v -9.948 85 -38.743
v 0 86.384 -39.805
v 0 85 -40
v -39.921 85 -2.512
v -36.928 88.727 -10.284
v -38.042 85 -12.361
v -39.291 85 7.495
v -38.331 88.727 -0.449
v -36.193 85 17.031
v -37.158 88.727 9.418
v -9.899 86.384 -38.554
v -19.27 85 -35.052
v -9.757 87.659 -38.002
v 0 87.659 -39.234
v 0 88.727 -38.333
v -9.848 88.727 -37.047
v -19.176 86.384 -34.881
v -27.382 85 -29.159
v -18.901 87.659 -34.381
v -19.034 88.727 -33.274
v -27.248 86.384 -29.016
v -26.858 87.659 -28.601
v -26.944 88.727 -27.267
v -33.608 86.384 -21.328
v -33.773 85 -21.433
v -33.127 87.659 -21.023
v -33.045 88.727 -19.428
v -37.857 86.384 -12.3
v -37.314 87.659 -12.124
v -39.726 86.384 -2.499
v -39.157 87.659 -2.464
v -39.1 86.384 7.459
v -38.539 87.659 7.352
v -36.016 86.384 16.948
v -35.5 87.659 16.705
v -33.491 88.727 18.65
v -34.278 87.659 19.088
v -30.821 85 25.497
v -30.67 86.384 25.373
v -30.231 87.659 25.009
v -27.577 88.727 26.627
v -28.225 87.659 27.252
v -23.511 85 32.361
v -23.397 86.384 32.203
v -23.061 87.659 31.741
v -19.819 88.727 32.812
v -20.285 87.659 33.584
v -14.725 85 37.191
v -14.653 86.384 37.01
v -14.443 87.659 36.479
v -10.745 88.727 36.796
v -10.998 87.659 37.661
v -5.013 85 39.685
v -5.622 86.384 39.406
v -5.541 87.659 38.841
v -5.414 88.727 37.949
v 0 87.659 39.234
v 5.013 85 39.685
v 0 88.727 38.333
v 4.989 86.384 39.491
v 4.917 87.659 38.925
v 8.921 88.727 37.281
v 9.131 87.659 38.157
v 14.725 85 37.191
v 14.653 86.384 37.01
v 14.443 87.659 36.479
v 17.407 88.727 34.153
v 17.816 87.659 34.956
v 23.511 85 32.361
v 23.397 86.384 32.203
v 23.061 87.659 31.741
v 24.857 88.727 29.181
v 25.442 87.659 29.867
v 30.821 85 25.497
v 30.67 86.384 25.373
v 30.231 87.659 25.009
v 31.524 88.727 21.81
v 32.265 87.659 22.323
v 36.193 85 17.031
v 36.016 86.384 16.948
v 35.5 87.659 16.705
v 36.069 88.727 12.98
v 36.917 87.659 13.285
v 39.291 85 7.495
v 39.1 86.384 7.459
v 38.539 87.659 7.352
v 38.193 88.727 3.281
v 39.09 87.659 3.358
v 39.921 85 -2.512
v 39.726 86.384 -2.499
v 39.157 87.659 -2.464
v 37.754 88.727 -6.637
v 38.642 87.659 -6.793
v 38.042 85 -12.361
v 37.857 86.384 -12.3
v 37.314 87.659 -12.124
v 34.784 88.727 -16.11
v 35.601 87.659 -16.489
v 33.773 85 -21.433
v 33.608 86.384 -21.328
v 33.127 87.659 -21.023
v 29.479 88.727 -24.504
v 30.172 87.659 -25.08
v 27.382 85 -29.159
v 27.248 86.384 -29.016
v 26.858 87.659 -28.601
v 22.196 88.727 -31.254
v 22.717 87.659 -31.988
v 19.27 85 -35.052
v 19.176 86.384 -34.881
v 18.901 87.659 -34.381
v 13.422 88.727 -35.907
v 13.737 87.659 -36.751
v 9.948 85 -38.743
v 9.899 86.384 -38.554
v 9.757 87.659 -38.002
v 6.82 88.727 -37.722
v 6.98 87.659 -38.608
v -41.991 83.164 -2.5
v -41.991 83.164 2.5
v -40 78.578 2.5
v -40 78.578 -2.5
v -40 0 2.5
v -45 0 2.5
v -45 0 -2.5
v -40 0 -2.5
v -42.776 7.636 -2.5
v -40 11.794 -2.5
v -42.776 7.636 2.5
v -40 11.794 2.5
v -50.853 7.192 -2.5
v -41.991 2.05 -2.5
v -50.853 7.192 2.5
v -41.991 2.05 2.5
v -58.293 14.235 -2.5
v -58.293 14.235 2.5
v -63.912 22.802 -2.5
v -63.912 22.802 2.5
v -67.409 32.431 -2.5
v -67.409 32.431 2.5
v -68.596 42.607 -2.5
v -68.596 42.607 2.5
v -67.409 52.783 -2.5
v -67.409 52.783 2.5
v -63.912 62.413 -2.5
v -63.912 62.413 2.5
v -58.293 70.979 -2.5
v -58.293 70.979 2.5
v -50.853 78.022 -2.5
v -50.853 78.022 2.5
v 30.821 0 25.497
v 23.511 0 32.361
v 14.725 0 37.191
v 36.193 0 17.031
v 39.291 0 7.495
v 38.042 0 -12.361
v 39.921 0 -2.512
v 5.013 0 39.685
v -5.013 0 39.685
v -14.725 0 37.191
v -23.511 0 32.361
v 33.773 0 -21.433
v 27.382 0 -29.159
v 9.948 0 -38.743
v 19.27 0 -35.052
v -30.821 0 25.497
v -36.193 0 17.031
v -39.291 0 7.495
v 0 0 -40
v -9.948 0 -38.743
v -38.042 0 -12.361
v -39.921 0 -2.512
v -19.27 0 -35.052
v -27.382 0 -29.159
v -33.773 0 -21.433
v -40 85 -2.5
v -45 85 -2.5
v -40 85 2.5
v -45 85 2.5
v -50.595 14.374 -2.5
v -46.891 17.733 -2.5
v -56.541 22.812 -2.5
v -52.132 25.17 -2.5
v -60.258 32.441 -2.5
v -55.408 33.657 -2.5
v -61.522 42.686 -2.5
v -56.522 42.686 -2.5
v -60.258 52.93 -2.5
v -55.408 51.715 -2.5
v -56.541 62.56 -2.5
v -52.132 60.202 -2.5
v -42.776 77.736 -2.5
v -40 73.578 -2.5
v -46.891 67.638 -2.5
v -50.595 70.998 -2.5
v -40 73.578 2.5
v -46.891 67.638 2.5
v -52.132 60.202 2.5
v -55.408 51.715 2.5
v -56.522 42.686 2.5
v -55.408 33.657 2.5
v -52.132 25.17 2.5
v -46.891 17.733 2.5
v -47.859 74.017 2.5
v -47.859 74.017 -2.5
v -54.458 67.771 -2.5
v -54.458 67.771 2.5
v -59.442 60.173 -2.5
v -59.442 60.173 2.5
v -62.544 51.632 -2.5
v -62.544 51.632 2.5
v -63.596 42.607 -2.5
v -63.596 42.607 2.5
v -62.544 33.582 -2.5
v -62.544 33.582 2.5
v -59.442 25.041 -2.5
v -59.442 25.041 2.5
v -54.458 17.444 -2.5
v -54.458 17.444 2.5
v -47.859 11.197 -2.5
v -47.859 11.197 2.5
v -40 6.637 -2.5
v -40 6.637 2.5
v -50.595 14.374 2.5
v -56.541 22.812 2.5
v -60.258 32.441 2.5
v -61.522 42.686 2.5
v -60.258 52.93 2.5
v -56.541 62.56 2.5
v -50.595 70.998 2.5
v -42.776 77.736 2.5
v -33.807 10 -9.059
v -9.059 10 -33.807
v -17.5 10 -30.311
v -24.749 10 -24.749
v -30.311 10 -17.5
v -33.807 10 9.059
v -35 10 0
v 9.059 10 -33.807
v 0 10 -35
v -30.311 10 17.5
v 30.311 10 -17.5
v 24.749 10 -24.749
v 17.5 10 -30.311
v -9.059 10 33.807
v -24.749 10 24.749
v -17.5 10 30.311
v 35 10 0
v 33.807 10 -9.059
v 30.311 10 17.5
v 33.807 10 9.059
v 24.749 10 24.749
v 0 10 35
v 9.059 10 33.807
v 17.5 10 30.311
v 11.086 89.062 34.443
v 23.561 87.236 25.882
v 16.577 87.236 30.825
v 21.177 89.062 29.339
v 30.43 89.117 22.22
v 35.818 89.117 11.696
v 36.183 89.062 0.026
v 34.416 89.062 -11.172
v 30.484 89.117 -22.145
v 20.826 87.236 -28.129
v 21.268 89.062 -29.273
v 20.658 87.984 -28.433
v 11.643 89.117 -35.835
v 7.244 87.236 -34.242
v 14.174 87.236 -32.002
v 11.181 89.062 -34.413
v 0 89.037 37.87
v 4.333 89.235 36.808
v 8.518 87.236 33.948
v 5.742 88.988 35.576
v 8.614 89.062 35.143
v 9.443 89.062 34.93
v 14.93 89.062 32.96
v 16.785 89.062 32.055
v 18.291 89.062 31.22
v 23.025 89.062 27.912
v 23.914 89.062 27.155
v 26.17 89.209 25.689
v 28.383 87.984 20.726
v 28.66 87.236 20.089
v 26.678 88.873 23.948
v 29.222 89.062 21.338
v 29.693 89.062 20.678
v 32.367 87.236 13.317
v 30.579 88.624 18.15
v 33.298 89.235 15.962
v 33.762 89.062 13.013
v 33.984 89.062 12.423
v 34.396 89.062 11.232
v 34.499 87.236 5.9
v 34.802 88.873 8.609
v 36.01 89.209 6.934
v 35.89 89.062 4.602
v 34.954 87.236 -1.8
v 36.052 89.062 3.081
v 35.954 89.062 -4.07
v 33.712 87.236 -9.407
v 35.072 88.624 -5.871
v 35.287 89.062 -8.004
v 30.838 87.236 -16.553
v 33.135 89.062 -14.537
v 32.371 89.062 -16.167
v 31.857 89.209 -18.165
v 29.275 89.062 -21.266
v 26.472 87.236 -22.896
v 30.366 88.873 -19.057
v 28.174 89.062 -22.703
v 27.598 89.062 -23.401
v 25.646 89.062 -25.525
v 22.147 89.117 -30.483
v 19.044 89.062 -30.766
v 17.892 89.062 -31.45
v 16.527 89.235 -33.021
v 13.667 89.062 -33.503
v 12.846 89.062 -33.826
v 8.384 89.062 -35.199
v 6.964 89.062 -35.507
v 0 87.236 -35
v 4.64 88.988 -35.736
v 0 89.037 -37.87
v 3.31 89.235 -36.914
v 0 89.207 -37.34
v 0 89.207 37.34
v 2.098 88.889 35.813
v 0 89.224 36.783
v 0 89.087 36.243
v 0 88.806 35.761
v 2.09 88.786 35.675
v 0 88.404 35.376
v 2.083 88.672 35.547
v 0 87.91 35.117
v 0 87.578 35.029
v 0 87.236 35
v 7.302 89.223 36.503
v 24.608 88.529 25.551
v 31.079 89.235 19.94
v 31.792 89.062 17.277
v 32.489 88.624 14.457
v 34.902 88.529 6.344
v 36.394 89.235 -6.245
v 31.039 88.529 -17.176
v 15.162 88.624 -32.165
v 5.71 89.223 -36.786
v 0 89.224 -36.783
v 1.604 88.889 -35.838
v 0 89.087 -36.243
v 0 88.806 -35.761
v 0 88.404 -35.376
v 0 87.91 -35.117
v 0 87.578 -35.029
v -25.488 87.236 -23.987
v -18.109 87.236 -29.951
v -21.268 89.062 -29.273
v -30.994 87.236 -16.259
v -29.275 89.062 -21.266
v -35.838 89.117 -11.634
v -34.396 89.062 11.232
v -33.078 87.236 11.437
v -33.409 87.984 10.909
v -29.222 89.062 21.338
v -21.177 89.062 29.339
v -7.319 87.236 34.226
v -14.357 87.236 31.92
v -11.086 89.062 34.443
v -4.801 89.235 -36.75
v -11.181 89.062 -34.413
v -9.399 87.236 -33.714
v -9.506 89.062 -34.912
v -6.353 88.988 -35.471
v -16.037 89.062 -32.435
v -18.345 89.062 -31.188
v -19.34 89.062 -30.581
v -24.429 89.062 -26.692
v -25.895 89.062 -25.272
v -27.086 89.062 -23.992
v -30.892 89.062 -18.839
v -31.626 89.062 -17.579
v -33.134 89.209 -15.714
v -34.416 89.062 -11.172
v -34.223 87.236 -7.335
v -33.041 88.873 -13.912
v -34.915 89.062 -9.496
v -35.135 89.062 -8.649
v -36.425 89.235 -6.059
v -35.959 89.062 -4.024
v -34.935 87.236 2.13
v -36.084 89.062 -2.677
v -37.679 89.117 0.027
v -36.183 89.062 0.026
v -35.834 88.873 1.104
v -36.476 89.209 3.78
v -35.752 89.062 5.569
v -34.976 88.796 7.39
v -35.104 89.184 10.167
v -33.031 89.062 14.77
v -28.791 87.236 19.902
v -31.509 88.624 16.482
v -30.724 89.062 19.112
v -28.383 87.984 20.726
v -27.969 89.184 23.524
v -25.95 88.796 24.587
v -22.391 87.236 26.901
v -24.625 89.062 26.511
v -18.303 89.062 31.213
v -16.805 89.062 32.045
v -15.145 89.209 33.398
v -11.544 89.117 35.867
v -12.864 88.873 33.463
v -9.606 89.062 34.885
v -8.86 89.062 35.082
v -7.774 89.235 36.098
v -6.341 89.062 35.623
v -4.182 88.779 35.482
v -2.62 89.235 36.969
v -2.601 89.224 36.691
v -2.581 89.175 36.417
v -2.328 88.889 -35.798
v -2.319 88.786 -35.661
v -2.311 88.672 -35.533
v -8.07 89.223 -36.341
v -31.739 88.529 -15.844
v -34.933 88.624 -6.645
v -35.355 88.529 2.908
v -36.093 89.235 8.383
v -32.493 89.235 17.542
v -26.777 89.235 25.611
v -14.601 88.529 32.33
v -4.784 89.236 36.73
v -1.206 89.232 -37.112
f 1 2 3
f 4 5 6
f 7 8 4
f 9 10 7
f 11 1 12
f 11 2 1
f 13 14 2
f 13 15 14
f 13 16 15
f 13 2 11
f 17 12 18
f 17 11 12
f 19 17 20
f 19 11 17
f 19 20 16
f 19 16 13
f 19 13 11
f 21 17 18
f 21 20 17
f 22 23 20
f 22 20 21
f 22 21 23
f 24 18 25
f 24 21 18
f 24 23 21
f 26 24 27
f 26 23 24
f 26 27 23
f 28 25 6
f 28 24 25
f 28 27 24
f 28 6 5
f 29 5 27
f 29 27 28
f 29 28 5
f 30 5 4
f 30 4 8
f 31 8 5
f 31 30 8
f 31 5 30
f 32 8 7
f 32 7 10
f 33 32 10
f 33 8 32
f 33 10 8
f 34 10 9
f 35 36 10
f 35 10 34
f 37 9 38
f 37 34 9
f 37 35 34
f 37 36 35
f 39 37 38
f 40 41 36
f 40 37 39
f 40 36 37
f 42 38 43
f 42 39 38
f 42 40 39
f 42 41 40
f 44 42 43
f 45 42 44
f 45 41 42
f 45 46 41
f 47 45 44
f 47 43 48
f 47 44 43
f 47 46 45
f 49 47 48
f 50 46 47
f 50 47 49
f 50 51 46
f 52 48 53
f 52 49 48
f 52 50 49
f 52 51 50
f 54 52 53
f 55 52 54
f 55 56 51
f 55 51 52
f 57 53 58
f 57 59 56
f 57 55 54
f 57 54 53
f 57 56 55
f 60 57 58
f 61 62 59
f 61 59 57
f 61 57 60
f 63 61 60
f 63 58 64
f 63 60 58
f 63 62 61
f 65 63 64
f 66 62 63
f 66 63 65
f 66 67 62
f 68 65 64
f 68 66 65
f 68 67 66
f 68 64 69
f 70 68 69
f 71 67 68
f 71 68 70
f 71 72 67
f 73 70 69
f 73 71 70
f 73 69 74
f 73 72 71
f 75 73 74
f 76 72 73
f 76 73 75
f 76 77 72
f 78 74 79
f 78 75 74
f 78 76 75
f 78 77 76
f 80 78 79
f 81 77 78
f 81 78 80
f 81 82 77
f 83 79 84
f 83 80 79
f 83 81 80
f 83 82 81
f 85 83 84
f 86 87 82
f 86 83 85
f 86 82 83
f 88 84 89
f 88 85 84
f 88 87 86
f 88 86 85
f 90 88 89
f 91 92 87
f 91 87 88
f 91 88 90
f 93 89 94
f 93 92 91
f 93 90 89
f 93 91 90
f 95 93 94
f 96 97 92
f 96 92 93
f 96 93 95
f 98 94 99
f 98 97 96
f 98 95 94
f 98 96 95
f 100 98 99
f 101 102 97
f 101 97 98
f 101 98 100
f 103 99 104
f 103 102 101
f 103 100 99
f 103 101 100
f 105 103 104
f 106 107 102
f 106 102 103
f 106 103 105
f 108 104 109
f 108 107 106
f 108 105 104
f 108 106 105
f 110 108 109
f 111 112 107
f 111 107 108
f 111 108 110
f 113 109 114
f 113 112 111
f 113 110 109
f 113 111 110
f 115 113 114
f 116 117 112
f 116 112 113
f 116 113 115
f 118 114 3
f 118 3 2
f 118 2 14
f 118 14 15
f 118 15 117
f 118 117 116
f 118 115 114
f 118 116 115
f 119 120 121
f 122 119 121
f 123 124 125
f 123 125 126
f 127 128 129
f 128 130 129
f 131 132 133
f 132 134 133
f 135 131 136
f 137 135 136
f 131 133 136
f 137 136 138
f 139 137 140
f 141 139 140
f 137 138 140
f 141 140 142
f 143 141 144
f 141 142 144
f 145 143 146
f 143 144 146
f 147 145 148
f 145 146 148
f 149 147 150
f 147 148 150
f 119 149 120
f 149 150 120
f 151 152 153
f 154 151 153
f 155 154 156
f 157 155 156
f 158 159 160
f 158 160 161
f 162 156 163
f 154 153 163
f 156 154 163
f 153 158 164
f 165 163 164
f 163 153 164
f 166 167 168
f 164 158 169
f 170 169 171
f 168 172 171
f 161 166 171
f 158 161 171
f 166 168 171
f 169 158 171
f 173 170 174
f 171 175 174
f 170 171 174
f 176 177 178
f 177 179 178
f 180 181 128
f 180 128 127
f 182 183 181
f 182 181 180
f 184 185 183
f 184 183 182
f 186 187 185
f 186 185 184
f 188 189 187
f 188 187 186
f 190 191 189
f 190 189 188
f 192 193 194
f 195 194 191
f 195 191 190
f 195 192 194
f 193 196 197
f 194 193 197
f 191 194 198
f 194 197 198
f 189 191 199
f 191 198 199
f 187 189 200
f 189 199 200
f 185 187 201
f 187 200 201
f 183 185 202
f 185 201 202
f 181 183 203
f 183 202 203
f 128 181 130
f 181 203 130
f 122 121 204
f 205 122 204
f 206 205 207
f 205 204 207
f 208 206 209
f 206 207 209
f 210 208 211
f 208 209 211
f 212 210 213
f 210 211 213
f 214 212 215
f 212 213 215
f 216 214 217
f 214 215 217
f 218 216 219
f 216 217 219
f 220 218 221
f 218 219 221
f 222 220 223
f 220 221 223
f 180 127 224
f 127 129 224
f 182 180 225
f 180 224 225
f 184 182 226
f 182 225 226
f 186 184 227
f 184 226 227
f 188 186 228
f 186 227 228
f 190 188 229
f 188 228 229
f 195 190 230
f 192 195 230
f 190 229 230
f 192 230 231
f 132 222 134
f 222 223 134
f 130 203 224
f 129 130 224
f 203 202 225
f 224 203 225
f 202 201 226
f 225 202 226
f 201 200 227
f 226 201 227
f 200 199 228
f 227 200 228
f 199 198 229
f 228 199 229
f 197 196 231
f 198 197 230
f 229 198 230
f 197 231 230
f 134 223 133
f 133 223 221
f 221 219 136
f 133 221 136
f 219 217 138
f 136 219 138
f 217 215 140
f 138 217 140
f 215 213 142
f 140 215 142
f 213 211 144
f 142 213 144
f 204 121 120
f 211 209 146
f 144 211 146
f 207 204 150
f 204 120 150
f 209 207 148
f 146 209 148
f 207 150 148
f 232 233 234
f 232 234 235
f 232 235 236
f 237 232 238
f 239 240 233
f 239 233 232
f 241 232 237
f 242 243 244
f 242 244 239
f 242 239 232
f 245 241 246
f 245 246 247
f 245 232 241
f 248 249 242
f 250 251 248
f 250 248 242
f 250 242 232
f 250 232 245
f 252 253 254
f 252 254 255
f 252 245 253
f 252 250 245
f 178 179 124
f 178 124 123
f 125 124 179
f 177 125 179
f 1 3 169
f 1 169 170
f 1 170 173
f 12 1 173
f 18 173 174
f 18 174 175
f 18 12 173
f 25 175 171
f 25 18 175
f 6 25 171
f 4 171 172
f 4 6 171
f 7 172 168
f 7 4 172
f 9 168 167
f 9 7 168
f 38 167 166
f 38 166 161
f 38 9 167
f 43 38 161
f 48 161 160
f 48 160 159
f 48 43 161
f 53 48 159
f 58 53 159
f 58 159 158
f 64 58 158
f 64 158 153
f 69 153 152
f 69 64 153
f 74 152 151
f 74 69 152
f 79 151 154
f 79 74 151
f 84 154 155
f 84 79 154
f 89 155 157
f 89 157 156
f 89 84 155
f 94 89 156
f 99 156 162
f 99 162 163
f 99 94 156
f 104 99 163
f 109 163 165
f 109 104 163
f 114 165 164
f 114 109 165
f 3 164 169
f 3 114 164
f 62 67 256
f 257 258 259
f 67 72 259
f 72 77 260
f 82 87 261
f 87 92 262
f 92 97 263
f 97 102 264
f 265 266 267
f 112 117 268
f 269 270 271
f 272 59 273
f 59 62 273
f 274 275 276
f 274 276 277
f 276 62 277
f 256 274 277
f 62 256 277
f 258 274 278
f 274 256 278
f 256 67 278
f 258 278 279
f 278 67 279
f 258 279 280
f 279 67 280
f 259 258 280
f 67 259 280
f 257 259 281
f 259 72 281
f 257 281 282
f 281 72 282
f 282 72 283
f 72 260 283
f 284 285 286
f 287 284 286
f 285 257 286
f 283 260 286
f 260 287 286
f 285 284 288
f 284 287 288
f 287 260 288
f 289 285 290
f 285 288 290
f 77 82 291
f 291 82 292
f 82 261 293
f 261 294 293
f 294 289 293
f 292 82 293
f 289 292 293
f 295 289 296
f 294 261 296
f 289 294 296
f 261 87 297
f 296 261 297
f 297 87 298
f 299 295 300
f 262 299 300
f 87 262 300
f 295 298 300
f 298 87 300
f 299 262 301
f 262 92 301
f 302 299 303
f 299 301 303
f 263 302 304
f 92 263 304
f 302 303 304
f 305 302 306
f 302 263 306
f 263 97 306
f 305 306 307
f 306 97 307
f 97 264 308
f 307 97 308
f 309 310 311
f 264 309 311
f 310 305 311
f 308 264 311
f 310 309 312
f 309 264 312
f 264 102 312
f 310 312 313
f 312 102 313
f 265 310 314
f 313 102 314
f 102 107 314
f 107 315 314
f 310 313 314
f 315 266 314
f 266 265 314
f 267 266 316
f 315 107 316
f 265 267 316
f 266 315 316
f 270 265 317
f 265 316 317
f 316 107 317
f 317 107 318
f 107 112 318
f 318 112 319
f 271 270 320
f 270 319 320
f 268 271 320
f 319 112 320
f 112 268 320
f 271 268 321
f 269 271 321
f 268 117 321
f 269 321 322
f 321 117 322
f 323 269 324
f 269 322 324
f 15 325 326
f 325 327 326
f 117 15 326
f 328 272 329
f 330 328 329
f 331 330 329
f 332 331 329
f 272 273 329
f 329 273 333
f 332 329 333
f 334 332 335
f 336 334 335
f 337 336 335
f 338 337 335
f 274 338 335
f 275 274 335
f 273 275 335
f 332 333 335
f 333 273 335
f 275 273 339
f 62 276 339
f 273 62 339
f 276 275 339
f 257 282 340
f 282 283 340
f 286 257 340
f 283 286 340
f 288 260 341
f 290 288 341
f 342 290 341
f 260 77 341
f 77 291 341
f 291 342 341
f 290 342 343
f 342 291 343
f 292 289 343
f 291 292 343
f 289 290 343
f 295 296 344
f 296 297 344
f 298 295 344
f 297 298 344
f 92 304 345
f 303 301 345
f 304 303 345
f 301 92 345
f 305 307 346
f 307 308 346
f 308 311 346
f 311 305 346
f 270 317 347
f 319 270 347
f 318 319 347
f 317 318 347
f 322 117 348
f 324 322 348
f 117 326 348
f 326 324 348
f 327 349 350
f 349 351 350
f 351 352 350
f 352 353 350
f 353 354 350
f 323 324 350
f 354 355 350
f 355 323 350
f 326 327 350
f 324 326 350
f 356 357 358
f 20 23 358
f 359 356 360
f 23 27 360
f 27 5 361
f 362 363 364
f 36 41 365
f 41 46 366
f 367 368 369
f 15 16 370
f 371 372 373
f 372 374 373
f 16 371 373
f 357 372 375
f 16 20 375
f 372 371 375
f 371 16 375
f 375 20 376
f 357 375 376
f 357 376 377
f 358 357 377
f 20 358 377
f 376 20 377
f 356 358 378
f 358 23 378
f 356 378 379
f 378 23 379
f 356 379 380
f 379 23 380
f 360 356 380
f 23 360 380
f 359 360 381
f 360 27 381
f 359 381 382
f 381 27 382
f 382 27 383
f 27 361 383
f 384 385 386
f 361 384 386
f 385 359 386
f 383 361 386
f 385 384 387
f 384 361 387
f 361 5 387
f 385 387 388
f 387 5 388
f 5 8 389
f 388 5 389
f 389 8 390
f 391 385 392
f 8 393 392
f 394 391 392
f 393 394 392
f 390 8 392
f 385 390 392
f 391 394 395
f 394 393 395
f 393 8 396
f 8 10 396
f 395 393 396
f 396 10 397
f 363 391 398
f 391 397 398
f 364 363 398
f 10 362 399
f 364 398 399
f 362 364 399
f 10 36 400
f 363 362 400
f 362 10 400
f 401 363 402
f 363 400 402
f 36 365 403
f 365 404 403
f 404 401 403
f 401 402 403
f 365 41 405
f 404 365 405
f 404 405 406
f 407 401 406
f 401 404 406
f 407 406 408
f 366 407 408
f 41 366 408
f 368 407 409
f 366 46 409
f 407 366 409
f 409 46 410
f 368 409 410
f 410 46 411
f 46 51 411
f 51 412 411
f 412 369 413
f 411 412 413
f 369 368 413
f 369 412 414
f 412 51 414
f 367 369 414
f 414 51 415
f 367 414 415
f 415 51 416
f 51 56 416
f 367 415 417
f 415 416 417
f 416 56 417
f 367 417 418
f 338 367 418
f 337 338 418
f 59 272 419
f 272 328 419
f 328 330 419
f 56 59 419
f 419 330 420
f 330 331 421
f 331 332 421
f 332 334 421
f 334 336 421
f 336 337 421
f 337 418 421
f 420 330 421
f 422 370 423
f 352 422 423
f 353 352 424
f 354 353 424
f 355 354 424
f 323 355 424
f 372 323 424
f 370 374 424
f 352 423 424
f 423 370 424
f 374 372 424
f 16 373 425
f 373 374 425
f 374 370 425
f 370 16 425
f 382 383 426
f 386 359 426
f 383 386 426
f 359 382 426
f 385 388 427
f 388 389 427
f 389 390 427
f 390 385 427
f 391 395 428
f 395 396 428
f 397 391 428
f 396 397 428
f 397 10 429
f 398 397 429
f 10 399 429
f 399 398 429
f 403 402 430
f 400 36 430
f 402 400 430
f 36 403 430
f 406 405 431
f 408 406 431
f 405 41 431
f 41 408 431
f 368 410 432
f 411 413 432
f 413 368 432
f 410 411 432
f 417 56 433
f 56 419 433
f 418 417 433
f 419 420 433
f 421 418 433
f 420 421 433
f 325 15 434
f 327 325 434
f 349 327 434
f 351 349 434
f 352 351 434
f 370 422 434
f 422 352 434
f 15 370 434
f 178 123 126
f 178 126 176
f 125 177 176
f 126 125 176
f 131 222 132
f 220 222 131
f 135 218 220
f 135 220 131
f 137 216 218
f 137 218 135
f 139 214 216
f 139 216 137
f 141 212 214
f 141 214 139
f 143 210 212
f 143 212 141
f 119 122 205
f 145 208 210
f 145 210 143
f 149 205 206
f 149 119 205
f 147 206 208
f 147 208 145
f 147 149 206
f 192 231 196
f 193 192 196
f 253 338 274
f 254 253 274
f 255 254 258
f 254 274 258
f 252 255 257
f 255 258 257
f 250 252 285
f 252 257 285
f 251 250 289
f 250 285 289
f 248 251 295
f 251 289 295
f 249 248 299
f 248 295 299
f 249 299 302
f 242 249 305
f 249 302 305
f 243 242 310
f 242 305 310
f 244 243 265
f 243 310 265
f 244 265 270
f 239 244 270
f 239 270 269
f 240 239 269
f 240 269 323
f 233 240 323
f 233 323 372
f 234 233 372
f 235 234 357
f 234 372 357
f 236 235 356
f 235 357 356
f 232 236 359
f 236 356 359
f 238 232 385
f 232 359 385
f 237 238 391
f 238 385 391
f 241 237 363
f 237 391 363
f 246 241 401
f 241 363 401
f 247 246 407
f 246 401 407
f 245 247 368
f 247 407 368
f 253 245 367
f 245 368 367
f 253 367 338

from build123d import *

# Parameters (mm, degrees)
ESBO_O3_W              = 40
ESBO_O3_H              = 90
ESBO_O9_R              = 35
CORTE_EXTRUS_O2_DEPTH  = 80
FILETE5_R              = 5
FILETE7_R              = 2
ESBO_O10_W             = 5
ESBO_O10_H             = 85
EXTRUS_O_FINA2_DEPTH   = 2.5
EXTRUS_O_FINA2_2_DEPTH = 2.5
EXTRUS_O_FINA2_3_DEPTH = 2.5


with BuildPart() as part:
    # Esboço3 → Revolução3 (revolve)
    with BuildSketch(Plane.XY, mode=Mode.PRIVATE) as revolu_o3_sk:
        with Locations((-20, 45)):
            Rectangle(ESBO_O3_W, ESBO_O3_H)
    revolve(revolu_o3_sk.sketch.rotate(Axis((0, 0, 0), (0, 1, 0)), 270), axis=Axis((0, 0, 0), (0, 1, 0)))

    # Esboço9 → Corte-extrusão2 (cut)
    with BuildSketch(Plane(origin=(0, 90, 0), x_dir=(1, 0, 0), z_dir=(0, 1, 0))):
        with Locations(Location((0, 0, 0), (0, 0, 270))):
            Circle(ESBO_O9_R)
    extrude(amount=-CORTE_EXTRUS_O2_DEPTH, mode=Mode.SUBTRACT)

    # Filete5
    filete5_edges = [part.edges().sort_by_distance(p)[0] for p in [
        (0, 90, 40),
    ]]
    fillet(filete5_edges, radius=FILETE5_R - 0.0001)  # a hair under: the kernel refuses the full size

    # Filete7
    filete7_edges = [part.edges().sort_by_distance(p)[0] for p in [
        (0, 90, -35),
    ]]
    fillet(filete7_edges, radius=FILETE7_R)


with BuildPart() as body_2:
    # Esboço10 → Extrusão-Fina2 (new, symmetric)
    with BuildSketch(Plane.XY):
        with Locations((-42.5, 42.5)):
            Rectangle(ESBO_O10_W, ESBO_O10_H)
    extrude(amount=EXTRUS_O_FINA2_DEPTH, both=True)


with BuildPart() as body_3:
    # Esboço10 → Extrus_o-Fina2 2 (new, symmetric)
    with BuildSketch(Plane.XY):
        with BuildLine():
            ThreePointArc((-40, 73.577519956), (-56.522136915, 42.685905601), (-40, 11.794291247))
            Line((-40, 11.794291247), (-42.775710518, 7.635513647))
            ThreePointArc((-42.775710518, 7.635513647), (-61.522136915, 42.685905601), (-42.775710518, 77.736297555))
            Line((-42.775710518, 77.736297555), (-40, 73.577519956))
        make_face()
    extrude(amount=EXTRUS_O_FINA2_2_DEPTH, both=True)


with BuildPart() as body_4:
    # Esboço10 → Extrus_o-Fina2 3 (new, symmetric)
    with BuildSketch(Plane.XY):
        with BuildLine():
            ThreePointArc((-40, 78.577519956), (-63.596209539, 42.607153315), (-40, 6.636786674))
            Line((-40, 6.636786674), (-41.991426841, 2.050478884))
            ThreePointArc((-41.991426841, 2.050478884), (-68.596209539, 42.607153315), (-41.991426841, 83.163827745))
            Line((-41.991426841, 83.163827745), (-40, 78.577519956))
        make_face()
    extrude(amount=EXTRUS_O_FINA2_3_DEPTH, both=True)


solid = Compound([part.part, body_2.part, body_3.part, body_4.part])
